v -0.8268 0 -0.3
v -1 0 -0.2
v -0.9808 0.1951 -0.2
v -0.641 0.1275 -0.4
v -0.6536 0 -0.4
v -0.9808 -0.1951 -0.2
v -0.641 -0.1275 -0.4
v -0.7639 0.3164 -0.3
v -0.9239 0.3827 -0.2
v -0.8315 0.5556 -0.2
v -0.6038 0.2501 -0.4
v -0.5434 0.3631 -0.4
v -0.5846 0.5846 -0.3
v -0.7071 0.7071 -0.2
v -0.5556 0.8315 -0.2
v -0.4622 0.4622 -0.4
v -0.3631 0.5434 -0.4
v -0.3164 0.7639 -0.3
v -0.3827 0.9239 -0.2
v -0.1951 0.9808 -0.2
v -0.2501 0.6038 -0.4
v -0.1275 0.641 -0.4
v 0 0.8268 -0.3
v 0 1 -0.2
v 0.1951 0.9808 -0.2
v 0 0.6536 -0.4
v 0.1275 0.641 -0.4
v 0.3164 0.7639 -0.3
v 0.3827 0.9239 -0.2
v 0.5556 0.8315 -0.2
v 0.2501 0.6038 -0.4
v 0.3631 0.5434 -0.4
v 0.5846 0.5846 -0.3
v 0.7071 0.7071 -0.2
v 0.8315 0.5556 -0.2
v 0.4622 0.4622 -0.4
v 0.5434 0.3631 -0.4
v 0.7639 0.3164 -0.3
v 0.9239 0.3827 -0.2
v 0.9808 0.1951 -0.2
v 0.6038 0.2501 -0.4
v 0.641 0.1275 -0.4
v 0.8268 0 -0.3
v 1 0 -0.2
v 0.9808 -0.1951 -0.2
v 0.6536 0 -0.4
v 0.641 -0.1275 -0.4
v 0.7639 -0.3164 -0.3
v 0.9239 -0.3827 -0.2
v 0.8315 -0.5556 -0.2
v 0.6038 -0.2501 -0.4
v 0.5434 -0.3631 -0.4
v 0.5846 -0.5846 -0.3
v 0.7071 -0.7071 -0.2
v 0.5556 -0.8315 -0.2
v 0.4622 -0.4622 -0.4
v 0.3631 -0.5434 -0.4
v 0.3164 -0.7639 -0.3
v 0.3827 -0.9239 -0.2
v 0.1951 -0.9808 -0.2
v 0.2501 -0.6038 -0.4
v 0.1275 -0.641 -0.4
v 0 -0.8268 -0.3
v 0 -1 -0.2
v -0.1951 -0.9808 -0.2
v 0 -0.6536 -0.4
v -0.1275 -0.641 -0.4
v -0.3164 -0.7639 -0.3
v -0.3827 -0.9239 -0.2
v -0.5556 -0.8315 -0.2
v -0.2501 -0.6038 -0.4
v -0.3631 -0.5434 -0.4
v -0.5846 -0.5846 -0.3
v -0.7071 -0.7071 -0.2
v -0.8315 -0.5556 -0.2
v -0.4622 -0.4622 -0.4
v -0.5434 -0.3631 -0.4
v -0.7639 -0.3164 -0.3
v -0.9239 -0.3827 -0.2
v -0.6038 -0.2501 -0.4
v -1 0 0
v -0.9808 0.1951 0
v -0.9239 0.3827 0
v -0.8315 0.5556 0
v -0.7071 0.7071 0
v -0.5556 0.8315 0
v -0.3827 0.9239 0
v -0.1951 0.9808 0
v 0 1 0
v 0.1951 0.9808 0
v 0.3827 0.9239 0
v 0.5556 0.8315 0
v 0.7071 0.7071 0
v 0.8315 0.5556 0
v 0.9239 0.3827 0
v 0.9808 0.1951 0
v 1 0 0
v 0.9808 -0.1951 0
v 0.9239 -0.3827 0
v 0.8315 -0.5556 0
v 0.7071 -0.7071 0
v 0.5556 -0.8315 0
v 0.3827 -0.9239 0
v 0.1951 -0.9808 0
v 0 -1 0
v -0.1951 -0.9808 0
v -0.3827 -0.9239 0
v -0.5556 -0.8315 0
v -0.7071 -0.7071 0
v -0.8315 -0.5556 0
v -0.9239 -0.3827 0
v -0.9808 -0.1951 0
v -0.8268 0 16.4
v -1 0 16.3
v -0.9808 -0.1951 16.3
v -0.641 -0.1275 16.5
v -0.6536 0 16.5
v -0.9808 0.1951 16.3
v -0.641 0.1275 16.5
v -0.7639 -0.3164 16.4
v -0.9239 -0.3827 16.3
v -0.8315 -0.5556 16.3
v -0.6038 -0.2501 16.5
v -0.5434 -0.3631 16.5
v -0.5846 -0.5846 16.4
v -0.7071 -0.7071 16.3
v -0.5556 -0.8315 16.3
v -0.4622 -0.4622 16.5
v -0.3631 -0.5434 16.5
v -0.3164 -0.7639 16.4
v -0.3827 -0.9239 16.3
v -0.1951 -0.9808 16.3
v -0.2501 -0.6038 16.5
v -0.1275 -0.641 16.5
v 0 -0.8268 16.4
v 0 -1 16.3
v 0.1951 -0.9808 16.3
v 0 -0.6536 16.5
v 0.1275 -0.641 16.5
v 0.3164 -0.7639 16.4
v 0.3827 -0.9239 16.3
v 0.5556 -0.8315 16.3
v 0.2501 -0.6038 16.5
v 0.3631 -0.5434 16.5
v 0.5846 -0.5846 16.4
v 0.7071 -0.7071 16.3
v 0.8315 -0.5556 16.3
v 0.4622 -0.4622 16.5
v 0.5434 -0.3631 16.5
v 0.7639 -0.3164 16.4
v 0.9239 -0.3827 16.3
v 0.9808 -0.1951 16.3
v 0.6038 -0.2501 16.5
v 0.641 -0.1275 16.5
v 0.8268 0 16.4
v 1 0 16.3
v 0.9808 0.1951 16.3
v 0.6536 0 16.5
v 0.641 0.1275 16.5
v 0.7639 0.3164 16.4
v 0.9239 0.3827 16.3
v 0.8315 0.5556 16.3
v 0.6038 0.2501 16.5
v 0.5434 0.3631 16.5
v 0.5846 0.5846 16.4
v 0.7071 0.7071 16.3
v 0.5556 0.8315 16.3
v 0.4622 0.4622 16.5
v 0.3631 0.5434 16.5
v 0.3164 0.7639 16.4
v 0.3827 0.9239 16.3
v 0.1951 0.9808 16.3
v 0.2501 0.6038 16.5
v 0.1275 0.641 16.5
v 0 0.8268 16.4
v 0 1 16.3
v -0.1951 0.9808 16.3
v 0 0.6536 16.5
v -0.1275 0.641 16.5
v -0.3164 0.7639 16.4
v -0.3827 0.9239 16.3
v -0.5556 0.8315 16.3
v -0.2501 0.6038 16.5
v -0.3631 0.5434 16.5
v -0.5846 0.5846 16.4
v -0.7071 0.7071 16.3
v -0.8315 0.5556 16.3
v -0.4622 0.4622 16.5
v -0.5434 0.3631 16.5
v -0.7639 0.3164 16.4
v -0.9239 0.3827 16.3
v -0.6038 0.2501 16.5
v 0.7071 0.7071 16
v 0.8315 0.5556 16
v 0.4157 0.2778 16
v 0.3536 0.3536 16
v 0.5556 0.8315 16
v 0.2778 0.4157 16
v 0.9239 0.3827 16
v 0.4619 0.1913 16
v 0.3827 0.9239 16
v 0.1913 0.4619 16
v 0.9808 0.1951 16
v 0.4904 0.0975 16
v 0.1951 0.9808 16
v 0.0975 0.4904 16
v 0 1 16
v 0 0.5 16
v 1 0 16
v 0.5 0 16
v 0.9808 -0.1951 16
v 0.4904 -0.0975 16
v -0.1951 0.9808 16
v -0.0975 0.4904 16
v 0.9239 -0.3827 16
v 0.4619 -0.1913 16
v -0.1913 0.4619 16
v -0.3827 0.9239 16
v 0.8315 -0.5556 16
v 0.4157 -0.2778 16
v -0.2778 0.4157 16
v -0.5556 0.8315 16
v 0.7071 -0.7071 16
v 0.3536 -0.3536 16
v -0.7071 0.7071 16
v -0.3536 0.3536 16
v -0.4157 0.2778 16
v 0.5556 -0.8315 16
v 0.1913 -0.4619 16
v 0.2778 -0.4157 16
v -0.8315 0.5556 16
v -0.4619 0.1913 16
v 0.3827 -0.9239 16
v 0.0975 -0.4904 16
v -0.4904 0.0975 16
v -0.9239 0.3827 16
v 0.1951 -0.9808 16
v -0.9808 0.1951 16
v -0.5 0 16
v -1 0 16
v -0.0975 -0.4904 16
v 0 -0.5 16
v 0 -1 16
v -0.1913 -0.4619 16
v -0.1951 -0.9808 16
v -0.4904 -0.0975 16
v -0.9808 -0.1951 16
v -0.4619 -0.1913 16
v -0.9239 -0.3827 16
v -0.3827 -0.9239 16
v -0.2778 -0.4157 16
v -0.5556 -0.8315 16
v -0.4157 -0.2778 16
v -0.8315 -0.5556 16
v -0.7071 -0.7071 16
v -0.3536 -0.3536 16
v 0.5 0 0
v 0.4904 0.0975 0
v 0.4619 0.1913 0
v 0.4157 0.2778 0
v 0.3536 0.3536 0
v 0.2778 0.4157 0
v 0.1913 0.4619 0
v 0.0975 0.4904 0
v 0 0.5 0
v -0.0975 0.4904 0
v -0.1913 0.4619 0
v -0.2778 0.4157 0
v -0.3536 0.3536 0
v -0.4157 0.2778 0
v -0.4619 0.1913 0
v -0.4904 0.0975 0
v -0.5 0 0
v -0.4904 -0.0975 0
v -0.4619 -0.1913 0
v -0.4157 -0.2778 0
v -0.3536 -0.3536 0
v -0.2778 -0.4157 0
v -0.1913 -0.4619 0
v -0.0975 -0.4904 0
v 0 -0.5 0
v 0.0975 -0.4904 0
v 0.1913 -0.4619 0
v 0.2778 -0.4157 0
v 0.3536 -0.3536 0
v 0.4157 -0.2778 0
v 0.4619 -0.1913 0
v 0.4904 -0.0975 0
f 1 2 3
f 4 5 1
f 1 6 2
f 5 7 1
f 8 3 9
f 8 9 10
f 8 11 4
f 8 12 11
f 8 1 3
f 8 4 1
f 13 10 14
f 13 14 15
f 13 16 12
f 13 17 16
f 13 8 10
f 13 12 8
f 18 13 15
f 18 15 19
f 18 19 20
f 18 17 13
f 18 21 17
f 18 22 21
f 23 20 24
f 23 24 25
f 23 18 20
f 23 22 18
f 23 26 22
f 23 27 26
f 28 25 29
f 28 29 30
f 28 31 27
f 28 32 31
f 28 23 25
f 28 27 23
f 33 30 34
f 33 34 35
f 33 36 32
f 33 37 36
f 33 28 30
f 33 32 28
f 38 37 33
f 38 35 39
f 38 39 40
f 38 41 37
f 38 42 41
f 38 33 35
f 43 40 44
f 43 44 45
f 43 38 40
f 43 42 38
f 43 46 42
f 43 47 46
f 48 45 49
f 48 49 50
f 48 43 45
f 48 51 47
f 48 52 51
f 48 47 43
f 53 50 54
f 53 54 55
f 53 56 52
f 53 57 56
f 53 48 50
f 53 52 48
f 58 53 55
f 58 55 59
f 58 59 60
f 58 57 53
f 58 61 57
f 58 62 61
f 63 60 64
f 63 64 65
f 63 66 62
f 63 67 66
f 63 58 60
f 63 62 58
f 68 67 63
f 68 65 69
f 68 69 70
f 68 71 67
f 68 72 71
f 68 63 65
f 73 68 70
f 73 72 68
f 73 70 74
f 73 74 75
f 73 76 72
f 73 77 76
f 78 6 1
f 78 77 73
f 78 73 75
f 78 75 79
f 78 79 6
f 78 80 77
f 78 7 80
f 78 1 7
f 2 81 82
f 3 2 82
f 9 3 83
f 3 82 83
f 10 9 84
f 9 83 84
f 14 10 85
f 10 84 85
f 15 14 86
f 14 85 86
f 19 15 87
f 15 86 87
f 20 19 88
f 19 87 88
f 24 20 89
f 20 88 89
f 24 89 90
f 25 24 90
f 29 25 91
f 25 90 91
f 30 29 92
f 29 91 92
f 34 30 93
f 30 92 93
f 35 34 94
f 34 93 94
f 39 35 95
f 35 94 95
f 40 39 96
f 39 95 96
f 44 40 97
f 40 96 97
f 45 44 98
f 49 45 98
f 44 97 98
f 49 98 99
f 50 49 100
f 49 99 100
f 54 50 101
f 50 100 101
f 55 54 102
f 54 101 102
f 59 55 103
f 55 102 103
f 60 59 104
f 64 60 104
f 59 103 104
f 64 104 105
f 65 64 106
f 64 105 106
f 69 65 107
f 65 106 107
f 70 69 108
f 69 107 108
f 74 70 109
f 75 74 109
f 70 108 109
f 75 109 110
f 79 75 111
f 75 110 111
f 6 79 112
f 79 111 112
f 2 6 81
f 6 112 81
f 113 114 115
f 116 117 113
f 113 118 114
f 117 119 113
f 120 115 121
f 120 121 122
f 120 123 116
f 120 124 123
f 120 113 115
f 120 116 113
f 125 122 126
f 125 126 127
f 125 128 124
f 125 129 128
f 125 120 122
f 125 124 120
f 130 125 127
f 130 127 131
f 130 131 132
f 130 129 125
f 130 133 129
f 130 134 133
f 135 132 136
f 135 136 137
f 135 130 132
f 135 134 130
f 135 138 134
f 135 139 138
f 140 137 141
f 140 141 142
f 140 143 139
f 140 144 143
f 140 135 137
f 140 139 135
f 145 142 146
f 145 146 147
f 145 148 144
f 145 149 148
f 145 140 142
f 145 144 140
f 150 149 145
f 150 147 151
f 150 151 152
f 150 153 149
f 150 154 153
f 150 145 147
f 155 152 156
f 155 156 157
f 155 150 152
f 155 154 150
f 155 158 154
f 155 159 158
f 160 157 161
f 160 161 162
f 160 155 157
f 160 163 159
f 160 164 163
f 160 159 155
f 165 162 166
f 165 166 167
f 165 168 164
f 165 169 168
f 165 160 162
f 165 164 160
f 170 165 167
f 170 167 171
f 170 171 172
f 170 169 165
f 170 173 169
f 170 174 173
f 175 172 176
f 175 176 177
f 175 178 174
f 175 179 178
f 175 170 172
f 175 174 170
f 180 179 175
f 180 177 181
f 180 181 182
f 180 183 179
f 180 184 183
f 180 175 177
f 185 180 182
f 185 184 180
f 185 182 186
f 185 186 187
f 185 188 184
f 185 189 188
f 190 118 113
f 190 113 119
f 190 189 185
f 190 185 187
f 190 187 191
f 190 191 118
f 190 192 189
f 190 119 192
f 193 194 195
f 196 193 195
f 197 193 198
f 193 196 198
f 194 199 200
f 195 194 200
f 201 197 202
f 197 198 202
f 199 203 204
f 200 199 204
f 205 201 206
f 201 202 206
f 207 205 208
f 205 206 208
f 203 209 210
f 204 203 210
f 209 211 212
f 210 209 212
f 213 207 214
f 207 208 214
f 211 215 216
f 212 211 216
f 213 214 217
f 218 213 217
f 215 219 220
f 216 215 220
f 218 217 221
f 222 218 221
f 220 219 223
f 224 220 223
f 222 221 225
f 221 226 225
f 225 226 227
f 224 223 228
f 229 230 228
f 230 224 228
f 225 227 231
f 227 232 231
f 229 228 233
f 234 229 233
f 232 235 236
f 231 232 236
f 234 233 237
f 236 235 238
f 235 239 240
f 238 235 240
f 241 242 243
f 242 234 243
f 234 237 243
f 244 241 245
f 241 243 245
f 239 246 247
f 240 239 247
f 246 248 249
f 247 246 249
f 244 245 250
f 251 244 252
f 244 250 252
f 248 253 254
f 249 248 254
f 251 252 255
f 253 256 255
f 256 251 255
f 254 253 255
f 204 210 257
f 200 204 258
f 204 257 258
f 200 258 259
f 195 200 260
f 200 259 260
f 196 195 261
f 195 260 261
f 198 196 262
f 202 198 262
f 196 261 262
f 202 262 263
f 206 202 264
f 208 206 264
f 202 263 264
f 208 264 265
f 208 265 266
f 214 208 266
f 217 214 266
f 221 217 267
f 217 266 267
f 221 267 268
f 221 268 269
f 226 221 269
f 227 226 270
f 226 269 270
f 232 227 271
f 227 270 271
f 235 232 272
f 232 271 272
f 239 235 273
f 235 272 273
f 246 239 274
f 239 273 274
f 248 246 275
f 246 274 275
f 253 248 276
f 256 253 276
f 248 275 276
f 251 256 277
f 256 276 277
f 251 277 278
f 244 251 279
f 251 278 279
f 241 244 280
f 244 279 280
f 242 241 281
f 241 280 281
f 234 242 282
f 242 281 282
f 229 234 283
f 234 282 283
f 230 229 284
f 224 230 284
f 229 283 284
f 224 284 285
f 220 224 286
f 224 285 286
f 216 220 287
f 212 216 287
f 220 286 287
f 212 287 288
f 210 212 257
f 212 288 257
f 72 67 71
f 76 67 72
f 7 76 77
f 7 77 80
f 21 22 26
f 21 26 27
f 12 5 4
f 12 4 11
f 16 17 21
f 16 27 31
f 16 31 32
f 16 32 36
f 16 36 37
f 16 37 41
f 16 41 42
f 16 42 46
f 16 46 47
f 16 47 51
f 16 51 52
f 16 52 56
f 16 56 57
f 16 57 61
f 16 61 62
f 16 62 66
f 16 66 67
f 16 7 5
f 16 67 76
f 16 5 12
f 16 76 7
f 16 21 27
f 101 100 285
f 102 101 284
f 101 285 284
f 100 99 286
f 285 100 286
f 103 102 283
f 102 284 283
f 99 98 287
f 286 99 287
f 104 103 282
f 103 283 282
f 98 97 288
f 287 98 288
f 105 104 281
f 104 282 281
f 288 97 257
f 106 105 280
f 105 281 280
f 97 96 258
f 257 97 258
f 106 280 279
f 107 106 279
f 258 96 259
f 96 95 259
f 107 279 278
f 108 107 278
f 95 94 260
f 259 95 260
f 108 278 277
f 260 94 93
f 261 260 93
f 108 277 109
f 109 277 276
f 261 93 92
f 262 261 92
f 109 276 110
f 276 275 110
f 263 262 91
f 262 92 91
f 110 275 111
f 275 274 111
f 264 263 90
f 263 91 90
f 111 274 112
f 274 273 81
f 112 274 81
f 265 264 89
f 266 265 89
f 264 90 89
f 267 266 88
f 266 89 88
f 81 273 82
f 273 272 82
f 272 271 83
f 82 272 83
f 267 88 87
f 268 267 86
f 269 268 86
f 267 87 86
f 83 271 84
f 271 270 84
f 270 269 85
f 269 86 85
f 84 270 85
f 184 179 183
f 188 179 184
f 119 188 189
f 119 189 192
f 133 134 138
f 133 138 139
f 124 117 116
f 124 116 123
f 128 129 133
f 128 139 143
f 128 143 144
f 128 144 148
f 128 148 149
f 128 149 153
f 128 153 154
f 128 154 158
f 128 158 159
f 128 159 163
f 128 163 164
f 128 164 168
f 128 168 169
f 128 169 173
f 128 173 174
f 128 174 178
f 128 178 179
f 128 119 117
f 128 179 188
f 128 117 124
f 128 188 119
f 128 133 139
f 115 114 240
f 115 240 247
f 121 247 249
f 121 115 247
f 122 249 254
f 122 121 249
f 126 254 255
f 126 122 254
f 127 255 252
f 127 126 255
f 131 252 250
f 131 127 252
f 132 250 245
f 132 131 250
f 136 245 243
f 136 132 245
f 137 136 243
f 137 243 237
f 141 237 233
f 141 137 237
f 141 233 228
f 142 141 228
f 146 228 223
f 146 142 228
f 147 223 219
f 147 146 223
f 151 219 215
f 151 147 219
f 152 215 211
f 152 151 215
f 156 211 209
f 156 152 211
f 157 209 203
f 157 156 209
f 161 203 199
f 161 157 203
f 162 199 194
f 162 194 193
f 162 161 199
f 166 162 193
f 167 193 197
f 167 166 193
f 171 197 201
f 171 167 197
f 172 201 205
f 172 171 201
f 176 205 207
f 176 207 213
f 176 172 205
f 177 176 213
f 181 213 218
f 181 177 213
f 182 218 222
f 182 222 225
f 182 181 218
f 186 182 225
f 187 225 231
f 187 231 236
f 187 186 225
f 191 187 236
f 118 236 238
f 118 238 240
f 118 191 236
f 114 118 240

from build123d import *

# Parameters (mm, degrees)
SKETCH1_R           = 0.5
BOSS_EXTRUDE1_DEPTH = 16
SKETCH2_R           = 1
BOSS_EXTRUDE2_DEPTH = 0.4
CHAMFER1_SIZE       = 0.2
CHAMFER1_SIZE2      = 0.346410162
BOSS_EXTRUDE3_START = 0.5
SKETCH3_R           = 1
BOSS_EXTRUDE3_DEPTH = 0.5
CHAMFER2_SIZE       = 0.2
CHAMFER2_SIZE2      = 0.346410162


with BuildPart() as part:
    # Sketch1 → Boss-Extrude1 (new body)
    with BuildSketch(Plane.XY):
        Circle(SKETCH1_R)
    extrude(amount=BOSS_EXTRUDE1_DEPTH)

    # Sketch2 → Boss-Extrude2 (add)
    with BuildSketch(Plane(origin=(0, 0, 0), x_dir=(-1, 0, 0), z_dir=(0, 0, -1))):
        Circle(SKETCH2_R)
    extrude(amount=BOSS_EXTRUDE2_DEPTH)

    # Chamfer1
    chamfer1_edges = [part.edges().sort_by_distance(p)[0] for p in [
        (1, 0, -0.4),
    ]]
    chamfer1_side = [part.faces().sort_by_distance(p)[0] for p in [
        (1, 0, -0.2),
    ]]
    chamfer(chamfer1_edges, length=CHAMFER1_SIZE, length2=CHAMFER1_SIZE2, reference=chamfer1_side[0])

    # Sketch3 → Boss-Extrude3 (add)
    with BuildSketch(Plane.XY.offset(16).offset(BOSS_EXTRUDE3_START)):
        with Locations(Location((0, 0, 0), (0, 0, 180))):
            Circle(SKETCH3_R)
    extrude(amount=-BOSS_EXTRUDE3_DEPTH)

    # Chamfer2
    chamfer2_edges = [part.edges().sort_by_distance(p)[0] for p in [
        (1, 0, 16.5),
    ]]
    chamfer2_side = [part.faces().sort_by_distance(p)[0] for p in [
        (1, 0, 16.25),
    ]]
    chamfer(chamfer2_edges, length=CHAMFER2_SIZE, length2=CHAMFER2_SIZE2, reference=chamfer2_side[0])


solid = part.part
